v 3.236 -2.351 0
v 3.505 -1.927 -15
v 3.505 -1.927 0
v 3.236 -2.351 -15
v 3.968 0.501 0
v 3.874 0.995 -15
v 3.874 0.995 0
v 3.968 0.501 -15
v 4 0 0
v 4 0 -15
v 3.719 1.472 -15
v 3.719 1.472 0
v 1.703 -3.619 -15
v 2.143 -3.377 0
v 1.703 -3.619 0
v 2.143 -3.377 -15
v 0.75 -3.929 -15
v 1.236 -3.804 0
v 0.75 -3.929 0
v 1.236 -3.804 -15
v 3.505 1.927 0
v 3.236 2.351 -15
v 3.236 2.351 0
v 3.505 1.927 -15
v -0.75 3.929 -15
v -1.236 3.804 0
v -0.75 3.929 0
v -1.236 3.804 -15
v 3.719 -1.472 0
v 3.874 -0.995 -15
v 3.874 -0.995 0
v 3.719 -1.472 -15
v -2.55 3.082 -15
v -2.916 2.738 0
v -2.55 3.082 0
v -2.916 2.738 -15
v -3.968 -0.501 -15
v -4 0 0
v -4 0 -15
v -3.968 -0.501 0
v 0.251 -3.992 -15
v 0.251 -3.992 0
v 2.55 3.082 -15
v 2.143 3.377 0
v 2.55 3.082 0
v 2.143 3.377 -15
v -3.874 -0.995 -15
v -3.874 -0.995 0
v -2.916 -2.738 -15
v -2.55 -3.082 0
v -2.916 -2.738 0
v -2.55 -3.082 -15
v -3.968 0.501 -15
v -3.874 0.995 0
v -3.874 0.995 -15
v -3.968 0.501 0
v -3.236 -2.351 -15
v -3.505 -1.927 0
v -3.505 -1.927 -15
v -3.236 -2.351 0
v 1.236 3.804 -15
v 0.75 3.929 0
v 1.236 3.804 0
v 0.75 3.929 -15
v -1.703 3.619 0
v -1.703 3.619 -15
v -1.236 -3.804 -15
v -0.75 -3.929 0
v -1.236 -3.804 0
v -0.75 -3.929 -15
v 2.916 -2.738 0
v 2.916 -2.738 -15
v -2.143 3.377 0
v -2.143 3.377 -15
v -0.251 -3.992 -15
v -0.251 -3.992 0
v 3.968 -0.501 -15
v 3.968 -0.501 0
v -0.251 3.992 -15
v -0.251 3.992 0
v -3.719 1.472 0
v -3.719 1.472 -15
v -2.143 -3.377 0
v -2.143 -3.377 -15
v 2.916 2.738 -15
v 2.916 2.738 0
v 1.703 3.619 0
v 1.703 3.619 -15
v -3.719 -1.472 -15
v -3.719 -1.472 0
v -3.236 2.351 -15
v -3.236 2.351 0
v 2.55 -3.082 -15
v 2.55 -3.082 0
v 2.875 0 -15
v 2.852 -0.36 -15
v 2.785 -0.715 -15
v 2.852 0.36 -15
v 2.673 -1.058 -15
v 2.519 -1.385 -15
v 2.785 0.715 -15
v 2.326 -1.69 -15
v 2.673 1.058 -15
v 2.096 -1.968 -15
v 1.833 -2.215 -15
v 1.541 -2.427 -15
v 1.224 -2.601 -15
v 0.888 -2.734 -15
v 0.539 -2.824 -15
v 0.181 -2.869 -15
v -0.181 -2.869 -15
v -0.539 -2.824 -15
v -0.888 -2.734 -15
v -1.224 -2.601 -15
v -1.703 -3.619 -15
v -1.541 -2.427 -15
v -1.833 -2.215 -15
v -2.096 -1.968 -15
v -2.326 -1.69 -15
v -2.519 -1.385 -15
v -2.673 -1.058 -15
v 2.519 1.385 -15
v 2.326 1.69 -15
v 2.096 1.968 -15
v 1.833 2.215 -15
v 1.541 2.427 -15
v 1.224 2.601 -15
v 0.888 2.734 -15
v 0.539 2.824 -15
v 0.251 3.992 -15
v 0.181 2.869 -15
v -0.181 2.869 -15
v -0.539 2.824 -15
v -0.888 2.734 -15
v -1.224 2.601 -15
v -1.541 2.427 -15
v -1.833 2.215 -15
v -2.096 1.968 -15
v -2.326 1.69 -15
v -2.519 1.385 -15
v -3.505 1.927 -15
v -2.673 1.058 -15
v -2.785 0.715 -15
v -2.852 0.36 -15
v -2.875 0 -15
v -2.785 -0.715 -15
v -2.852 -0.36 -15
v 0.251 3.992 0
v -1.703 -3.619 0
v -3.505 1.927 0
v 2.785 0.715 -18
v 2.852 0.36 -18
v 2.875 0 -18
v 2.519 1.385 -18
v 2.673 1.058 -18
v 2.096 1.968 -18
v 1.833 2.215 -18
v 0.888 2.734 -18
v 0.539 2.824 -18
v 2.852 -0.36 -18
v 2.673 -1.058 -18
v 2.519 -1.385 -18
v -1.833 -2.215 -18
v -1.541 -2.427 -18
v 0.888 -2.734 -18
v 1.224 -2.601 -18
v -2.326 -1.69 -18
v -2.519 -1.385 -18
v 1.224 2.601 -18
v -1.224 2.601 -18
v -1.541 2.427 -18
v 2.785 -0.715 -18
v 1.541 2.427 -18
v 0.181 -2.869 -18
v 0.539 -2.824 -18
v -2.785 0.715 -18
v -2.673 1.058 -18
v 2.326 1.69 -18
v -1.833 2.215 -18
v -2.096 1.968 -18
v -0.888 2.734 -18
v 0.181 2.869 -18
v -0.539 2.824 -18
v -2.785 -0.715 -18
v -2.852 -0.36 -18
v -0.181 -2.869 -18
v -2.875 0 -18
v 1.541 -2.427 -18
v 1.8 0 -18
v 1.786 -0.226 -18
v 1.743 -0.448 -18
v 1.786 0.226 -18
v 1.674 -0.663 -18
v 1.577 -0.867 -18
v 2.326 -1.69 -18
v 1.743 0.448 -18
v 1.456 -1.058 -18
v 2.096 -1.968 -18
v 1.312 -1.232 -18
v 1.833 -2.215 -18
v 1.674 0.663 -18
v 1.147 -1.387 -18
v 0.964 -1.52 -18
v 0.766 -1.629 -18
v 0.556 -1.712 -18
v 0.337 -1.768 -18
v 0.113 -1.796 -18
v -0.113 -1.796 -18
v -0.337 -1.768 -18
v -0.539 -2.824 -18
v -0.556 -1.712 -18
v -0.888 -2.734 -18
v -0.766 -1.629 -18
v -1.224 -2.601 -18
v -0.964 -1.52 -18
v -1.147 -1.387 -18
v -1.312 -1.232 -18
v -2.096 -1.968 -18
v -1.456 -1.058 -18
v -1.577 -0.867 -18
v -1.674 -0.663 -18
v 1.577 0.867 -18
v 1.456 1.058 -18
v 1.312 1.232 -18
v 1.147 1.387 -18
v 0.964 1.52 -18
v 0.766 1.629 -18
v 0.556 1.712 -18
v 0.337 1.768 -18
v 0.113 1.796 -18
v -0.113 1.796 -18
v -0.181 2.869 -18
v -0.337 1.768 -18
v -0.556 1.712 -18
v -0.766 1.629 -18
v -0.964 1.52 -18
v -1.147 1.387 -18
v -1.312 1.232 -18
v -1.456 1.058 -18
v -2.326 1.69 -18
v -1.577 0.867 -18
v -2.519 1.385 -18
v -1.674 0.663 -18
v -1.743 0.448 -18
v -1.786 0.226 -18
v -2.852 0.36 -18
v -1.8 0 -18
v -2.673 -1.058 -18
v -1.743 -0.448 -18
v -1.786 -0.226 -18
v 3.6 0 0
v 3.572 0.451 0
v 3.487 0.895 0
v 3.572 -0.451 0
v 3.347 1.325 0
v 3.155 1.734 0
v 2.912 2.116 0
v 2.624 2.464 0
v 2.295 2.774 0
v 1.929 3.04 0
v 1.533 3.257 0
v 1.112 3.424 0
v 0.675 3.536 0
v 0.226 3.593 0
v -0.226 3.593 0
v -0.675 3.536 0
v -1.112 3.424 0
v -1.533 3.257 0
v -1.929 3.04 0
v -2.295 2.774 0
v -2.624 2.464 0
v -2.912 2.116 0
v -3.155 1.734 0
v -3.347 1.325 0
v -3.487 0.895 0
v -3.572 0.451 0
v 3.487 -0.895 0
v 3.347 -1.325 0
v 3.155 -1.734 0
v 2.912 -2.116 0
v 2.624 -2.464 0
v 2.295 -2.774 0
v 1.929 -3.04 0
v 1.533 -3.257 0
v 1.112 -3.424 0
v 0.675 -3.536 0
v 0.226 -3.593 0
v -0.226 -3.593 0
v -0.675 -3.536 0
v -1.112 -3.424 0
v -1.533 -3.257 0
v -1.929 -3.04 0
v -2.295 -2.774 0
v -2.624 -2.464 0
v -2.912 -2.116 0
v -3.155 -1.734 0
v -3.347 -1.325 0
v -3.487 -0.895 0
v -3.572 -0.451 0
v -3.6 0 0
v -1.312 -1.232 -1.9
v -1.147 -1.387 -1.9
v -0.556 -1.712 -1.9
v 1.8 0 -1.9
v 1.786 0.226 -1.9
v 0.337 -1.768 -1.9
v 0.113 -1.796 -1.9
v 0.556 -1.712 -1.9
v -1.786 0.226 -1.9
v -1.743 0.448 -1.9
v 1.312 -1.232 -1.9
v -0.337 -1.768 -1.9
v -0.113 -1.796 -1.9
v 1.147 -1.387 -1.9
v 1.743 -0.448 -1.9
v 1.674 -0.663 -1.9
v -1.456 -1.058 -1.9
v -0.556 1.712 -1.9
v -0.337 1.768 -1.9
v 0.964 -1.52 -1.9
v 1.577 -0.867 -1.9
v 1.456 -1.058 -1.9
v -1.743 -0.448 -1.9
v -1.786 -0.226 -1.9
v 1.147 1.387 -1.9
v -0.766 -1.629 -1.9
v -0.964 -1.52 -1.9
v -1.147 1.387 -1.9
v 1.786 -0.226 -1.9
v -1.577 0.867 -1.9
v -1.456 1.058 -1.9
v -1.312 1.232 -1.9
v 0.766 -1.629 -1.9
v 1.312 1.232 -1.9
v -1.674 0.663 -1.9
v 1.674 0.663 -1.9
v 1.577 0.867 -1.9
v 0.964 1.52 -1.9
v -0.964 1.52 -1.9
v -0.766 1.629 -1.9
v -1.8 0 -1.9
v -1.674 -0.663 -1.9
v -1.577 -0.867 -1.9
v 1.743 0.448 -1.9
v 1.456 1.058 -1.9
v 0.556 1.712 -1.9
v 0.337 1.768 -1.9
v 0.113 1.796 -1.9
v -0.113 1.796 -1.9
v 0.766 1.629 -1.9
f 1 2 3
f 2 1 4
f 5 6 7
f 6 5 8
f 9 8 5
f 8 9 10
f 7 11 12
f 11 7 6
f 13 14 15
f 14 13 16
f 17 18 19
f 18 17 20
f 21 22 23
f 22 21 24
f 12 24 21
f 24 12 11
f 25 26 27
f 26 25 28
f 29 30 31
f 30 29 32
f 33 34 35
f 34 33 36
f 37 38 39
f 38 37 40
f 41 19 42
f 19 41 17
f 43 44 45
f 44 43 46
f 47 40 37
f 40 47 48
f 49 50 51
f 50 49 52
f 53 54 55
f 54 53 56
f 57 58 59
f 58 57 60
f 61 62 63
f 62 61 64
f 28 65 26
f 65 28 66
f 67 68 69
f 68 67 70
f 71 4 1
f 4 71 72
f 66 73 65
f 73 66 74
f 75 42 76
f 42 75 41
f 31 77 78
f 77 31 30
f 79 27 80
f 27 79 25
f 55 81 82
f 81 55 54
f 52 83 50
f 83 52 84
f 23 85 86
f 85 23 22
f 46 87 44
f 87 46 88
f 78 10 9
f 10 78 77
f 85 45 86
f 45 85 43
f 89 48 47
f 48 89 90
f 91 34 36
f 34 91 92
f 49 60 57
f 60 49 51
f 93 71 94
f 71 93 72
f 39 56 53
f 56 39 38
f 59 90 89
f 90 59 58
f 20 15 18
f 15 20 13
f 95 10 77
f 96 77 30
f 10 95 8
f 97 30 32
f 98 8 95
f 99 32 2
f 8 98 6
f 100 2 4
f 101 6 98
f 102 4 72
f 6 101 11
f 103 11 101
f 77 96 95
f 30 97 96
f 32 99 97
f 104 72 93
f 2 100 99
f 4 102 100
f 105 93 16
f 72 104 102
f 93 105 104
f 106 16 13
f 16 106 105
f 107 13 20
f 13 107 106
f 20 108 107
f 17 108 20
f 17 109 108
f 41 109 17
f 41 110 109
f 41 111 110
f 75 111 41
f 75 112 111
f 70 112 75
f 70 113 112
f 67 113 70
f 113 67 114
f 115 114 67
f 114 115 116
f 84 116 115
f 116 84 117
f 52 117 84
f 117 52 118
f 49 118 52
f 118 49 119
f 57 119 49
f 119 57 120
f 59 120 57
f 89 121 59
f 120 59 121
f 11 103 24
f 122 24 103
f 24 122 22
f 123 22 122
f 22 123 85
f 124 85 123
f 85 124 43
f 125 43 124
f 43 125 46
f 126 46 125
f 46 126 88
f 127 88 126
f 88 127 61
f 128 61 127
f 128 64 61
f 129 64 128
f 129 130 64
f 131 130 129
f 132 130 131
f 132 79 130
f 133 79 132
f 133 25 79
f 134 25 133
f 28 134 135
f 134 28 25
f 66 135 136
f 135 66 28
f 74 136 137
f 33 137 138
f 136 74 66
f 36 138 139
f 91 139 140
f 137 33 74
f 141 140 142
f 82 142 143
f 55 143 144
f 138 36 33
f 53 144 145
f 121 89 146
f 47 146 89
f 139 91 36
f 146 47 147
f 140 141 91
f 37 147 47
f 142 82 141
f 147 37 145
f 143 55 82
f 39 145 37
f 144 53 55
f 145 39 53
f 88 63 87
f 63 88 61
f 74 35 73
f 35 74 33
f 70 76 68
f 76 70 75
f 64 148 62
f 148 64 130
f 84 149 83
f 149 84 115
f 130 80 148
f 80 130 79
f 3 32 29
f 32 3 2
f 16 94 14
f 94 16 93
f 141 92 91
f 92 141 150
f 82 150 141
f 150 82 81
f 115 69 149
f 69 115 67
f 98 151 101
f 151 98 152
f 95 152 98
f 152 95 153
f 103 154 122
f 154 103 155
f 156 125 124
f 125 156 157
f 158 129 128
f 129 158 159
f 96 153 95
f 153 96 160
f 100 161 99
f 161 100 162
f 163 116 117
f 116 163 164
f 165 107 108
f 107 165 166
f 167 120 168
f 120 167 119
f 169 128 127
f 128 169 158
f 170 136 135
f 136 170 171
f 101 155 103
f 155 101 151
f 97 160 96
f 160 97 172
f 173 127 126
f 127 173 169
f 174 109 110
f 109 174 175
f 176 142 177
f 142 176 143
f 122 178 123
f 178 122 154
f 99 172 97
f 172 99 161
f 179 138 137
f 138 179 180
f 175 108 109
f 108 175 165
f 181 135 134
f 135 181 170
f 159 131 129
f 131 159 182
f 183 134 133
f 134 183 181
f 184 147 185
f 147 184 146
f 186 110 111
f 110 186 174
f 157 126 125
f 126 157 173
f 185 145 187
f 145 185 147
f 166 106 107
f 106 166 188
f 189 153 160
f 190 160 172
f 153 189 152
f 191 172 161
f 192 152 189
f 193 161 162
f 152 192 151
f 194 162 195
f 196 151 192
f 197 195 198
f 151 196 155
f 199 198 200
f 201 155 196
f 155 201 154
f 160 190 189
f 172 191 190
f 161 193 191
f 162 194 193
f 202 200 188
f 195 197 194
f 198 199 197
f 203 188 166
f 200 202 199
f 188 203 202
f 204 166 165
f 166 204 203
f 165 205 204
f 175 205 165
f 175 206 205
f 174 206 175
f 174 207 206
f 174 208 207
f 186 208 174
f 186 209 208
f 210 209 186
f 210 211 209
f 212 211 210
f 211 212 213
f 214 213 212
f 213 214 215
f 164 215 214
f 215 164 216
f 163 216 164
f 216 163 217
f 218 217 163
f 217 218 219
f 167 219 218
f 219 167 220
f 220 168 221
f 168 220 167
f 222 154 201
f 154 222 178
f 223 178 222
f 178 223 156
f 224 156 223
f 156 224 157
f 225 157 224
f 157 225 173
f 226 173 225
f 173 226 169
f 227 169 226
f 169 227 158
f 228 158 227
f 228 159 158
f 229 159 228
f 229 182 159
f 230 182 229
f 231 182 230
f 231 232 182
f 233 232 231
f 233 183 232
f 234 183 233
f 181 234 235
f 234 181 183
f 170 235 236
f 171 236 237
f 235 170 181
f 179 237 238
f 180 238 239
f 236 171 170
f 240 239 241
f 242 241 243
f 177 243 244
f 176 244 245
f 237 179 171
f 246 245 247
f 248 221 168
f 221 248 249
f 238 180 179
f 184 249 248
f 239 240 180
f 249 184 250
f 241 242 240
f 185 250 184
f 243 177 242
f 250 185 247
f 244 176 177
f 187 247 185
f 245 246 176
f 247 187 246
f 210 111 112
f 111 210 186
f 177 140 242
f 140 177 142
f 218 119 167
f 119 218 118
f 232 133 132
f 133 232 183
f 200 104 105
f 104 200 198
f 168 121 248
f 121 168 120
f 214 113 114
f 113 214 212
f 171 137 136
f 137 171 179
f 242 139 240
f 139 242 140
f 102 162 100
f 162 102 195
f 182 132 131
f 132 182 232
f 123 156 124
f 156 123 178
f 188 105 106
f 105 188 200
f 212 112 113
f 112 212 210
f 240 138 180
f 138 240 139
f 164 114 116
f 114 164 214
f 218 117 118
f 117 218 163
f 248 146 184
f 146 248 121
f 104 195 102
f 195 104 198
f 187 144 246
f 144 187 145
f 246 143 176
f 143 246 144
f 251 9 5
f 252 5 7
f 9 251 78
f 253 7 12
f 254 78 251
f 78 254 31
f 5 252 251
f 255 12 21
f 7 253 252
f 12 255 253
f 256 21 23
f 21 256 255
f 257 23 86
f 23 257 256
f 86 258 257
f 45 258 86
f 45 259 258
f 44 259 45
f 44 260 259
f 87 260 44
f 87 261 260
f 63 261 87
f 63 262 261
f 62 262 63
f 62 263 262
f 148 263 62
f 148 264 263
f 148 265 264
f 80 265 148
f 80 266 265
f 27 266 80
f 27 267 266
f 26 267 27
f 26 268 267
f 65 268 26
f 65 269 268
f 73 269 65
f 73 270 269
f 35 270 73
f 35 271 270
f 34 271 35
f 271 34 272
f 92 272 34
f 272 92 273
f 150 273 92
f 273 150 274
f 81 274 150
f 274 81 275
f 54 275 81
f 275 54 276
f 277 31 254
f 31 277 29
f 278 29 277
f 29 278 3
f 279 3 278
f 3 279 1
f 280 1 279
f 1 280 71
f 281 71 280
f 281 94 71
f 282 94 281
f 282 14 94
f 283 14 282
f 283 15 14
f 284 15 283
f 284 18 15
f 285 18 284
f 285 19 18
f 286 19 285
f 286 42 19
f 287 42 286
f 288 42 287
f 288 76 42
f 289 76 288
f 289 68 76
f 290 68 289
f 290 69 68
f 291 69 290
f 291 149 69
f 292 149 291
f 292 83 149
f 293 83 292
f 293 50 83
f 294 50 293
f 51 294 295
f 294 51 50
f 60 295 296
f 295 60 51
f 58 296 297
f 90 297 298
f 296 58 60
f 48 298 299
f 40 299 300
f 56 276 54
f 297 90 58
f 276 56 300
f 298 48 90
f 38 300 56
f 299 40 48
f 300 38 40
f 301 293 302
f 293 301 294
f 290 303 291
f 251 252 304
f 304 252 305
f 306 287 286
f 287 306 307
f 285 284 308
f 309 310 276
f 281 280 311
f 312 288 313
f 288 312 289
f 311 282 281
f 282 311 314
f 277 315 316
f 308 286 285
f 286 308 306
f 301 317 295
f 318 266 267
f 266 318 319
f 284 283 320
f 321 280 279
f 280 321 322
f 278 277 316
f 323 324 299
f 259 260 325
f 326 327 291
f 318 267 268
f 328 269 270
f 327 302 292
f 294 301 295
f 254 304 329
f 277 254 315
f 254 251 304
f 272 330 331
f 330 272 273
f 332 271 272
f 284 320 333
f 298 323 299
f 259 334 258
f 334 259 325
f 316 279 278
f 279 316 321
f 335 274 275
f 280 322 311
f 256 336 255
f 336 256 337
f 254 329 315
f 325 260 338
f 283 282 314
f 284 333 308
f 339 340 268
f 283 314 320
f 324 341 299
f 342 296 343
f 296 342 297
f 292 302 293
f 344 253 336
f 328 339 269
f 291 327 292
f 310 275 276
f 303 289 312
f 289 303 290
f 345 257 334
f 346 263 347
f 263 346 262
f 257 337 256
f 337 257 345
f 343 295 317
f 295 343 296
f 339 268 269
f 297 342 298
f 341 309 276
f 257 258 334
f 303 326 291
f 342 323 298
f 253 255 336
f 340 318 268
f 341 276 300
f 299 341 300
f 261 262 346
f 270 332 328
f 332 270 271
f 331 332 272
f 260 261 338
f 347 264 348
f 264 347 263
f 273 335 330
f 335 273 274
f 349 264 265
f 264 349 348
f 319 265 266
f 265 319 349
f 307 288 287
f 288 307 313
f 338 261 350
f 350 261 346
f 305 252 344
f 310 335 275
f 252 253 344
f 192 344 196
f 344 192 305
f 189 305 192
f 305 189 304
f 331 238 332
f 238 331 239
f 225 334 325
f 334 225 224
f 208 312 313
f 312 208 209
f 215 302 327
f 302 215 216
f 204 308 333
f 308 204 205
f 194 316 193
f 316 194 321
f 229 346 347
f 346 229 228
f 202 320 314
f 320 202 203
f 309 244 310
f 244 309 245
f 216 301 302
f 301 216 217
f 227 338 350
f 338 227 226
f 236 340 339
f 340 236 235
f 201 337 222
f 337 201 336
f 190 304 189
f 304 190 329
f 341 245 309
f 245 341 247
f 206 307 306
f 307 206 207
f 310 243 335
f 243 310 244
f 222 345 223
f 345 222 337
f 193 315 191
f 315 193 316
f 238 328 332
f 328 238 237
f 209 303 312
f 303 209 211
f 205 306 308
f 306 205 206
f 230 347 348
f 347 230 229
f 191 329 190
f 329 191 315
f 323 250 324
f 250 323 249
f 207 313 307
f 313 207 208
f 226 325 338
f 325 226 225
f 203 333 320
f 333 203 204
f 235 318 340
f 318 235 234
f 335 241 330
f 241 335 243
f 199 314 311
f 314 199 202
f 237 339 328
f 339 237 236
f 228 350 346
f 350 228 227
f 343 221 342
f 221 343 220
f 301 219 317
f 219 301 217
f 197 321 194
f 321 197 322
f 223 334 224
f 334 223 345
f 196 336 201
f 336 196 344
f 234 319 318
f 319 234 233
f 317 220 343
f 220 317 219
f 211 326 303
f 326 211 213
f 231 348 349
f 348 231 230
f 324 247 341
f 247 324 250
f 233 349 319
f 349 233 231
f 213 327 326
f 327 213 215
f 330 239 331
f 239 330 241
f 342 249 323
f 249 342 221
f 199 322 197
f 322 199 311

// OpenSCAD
$fn = 50;

difference() {
	union() {
		translate(v = [0, 0, -15.0]) {
			cylinder(h = 18, r = 4.0);
		}
		#translate(v = [0, 0, -18.0]) {
			cylinder(h = 18, r = 2.875);
		}
	}
	union() {
		translate(v = [0, 0, 0]) {
			rotate(a = [0, 0, 0]) {
				difference() {
					union() {
						translate(v = [0, 0, -18.0]) {
							cylinder(h = 18, r = 1.5);
						}
						translate(v = [0, 0, -1.9]) {
							cylinder(h = 1.9, r1 = 1.8, r2 = 3.6);
						}
						translate(v = [0, 0, -18.0]) {
							cylinder(h = 18, r = 1.8);
						}
						translate(v = [0, 0, -18.0]) {
							cylinder(h = 18, r = 1.5);
						}
					}
					union();
				}
			}
		}
		#cylinder(h = 3, r = 5.0);
	}
}
